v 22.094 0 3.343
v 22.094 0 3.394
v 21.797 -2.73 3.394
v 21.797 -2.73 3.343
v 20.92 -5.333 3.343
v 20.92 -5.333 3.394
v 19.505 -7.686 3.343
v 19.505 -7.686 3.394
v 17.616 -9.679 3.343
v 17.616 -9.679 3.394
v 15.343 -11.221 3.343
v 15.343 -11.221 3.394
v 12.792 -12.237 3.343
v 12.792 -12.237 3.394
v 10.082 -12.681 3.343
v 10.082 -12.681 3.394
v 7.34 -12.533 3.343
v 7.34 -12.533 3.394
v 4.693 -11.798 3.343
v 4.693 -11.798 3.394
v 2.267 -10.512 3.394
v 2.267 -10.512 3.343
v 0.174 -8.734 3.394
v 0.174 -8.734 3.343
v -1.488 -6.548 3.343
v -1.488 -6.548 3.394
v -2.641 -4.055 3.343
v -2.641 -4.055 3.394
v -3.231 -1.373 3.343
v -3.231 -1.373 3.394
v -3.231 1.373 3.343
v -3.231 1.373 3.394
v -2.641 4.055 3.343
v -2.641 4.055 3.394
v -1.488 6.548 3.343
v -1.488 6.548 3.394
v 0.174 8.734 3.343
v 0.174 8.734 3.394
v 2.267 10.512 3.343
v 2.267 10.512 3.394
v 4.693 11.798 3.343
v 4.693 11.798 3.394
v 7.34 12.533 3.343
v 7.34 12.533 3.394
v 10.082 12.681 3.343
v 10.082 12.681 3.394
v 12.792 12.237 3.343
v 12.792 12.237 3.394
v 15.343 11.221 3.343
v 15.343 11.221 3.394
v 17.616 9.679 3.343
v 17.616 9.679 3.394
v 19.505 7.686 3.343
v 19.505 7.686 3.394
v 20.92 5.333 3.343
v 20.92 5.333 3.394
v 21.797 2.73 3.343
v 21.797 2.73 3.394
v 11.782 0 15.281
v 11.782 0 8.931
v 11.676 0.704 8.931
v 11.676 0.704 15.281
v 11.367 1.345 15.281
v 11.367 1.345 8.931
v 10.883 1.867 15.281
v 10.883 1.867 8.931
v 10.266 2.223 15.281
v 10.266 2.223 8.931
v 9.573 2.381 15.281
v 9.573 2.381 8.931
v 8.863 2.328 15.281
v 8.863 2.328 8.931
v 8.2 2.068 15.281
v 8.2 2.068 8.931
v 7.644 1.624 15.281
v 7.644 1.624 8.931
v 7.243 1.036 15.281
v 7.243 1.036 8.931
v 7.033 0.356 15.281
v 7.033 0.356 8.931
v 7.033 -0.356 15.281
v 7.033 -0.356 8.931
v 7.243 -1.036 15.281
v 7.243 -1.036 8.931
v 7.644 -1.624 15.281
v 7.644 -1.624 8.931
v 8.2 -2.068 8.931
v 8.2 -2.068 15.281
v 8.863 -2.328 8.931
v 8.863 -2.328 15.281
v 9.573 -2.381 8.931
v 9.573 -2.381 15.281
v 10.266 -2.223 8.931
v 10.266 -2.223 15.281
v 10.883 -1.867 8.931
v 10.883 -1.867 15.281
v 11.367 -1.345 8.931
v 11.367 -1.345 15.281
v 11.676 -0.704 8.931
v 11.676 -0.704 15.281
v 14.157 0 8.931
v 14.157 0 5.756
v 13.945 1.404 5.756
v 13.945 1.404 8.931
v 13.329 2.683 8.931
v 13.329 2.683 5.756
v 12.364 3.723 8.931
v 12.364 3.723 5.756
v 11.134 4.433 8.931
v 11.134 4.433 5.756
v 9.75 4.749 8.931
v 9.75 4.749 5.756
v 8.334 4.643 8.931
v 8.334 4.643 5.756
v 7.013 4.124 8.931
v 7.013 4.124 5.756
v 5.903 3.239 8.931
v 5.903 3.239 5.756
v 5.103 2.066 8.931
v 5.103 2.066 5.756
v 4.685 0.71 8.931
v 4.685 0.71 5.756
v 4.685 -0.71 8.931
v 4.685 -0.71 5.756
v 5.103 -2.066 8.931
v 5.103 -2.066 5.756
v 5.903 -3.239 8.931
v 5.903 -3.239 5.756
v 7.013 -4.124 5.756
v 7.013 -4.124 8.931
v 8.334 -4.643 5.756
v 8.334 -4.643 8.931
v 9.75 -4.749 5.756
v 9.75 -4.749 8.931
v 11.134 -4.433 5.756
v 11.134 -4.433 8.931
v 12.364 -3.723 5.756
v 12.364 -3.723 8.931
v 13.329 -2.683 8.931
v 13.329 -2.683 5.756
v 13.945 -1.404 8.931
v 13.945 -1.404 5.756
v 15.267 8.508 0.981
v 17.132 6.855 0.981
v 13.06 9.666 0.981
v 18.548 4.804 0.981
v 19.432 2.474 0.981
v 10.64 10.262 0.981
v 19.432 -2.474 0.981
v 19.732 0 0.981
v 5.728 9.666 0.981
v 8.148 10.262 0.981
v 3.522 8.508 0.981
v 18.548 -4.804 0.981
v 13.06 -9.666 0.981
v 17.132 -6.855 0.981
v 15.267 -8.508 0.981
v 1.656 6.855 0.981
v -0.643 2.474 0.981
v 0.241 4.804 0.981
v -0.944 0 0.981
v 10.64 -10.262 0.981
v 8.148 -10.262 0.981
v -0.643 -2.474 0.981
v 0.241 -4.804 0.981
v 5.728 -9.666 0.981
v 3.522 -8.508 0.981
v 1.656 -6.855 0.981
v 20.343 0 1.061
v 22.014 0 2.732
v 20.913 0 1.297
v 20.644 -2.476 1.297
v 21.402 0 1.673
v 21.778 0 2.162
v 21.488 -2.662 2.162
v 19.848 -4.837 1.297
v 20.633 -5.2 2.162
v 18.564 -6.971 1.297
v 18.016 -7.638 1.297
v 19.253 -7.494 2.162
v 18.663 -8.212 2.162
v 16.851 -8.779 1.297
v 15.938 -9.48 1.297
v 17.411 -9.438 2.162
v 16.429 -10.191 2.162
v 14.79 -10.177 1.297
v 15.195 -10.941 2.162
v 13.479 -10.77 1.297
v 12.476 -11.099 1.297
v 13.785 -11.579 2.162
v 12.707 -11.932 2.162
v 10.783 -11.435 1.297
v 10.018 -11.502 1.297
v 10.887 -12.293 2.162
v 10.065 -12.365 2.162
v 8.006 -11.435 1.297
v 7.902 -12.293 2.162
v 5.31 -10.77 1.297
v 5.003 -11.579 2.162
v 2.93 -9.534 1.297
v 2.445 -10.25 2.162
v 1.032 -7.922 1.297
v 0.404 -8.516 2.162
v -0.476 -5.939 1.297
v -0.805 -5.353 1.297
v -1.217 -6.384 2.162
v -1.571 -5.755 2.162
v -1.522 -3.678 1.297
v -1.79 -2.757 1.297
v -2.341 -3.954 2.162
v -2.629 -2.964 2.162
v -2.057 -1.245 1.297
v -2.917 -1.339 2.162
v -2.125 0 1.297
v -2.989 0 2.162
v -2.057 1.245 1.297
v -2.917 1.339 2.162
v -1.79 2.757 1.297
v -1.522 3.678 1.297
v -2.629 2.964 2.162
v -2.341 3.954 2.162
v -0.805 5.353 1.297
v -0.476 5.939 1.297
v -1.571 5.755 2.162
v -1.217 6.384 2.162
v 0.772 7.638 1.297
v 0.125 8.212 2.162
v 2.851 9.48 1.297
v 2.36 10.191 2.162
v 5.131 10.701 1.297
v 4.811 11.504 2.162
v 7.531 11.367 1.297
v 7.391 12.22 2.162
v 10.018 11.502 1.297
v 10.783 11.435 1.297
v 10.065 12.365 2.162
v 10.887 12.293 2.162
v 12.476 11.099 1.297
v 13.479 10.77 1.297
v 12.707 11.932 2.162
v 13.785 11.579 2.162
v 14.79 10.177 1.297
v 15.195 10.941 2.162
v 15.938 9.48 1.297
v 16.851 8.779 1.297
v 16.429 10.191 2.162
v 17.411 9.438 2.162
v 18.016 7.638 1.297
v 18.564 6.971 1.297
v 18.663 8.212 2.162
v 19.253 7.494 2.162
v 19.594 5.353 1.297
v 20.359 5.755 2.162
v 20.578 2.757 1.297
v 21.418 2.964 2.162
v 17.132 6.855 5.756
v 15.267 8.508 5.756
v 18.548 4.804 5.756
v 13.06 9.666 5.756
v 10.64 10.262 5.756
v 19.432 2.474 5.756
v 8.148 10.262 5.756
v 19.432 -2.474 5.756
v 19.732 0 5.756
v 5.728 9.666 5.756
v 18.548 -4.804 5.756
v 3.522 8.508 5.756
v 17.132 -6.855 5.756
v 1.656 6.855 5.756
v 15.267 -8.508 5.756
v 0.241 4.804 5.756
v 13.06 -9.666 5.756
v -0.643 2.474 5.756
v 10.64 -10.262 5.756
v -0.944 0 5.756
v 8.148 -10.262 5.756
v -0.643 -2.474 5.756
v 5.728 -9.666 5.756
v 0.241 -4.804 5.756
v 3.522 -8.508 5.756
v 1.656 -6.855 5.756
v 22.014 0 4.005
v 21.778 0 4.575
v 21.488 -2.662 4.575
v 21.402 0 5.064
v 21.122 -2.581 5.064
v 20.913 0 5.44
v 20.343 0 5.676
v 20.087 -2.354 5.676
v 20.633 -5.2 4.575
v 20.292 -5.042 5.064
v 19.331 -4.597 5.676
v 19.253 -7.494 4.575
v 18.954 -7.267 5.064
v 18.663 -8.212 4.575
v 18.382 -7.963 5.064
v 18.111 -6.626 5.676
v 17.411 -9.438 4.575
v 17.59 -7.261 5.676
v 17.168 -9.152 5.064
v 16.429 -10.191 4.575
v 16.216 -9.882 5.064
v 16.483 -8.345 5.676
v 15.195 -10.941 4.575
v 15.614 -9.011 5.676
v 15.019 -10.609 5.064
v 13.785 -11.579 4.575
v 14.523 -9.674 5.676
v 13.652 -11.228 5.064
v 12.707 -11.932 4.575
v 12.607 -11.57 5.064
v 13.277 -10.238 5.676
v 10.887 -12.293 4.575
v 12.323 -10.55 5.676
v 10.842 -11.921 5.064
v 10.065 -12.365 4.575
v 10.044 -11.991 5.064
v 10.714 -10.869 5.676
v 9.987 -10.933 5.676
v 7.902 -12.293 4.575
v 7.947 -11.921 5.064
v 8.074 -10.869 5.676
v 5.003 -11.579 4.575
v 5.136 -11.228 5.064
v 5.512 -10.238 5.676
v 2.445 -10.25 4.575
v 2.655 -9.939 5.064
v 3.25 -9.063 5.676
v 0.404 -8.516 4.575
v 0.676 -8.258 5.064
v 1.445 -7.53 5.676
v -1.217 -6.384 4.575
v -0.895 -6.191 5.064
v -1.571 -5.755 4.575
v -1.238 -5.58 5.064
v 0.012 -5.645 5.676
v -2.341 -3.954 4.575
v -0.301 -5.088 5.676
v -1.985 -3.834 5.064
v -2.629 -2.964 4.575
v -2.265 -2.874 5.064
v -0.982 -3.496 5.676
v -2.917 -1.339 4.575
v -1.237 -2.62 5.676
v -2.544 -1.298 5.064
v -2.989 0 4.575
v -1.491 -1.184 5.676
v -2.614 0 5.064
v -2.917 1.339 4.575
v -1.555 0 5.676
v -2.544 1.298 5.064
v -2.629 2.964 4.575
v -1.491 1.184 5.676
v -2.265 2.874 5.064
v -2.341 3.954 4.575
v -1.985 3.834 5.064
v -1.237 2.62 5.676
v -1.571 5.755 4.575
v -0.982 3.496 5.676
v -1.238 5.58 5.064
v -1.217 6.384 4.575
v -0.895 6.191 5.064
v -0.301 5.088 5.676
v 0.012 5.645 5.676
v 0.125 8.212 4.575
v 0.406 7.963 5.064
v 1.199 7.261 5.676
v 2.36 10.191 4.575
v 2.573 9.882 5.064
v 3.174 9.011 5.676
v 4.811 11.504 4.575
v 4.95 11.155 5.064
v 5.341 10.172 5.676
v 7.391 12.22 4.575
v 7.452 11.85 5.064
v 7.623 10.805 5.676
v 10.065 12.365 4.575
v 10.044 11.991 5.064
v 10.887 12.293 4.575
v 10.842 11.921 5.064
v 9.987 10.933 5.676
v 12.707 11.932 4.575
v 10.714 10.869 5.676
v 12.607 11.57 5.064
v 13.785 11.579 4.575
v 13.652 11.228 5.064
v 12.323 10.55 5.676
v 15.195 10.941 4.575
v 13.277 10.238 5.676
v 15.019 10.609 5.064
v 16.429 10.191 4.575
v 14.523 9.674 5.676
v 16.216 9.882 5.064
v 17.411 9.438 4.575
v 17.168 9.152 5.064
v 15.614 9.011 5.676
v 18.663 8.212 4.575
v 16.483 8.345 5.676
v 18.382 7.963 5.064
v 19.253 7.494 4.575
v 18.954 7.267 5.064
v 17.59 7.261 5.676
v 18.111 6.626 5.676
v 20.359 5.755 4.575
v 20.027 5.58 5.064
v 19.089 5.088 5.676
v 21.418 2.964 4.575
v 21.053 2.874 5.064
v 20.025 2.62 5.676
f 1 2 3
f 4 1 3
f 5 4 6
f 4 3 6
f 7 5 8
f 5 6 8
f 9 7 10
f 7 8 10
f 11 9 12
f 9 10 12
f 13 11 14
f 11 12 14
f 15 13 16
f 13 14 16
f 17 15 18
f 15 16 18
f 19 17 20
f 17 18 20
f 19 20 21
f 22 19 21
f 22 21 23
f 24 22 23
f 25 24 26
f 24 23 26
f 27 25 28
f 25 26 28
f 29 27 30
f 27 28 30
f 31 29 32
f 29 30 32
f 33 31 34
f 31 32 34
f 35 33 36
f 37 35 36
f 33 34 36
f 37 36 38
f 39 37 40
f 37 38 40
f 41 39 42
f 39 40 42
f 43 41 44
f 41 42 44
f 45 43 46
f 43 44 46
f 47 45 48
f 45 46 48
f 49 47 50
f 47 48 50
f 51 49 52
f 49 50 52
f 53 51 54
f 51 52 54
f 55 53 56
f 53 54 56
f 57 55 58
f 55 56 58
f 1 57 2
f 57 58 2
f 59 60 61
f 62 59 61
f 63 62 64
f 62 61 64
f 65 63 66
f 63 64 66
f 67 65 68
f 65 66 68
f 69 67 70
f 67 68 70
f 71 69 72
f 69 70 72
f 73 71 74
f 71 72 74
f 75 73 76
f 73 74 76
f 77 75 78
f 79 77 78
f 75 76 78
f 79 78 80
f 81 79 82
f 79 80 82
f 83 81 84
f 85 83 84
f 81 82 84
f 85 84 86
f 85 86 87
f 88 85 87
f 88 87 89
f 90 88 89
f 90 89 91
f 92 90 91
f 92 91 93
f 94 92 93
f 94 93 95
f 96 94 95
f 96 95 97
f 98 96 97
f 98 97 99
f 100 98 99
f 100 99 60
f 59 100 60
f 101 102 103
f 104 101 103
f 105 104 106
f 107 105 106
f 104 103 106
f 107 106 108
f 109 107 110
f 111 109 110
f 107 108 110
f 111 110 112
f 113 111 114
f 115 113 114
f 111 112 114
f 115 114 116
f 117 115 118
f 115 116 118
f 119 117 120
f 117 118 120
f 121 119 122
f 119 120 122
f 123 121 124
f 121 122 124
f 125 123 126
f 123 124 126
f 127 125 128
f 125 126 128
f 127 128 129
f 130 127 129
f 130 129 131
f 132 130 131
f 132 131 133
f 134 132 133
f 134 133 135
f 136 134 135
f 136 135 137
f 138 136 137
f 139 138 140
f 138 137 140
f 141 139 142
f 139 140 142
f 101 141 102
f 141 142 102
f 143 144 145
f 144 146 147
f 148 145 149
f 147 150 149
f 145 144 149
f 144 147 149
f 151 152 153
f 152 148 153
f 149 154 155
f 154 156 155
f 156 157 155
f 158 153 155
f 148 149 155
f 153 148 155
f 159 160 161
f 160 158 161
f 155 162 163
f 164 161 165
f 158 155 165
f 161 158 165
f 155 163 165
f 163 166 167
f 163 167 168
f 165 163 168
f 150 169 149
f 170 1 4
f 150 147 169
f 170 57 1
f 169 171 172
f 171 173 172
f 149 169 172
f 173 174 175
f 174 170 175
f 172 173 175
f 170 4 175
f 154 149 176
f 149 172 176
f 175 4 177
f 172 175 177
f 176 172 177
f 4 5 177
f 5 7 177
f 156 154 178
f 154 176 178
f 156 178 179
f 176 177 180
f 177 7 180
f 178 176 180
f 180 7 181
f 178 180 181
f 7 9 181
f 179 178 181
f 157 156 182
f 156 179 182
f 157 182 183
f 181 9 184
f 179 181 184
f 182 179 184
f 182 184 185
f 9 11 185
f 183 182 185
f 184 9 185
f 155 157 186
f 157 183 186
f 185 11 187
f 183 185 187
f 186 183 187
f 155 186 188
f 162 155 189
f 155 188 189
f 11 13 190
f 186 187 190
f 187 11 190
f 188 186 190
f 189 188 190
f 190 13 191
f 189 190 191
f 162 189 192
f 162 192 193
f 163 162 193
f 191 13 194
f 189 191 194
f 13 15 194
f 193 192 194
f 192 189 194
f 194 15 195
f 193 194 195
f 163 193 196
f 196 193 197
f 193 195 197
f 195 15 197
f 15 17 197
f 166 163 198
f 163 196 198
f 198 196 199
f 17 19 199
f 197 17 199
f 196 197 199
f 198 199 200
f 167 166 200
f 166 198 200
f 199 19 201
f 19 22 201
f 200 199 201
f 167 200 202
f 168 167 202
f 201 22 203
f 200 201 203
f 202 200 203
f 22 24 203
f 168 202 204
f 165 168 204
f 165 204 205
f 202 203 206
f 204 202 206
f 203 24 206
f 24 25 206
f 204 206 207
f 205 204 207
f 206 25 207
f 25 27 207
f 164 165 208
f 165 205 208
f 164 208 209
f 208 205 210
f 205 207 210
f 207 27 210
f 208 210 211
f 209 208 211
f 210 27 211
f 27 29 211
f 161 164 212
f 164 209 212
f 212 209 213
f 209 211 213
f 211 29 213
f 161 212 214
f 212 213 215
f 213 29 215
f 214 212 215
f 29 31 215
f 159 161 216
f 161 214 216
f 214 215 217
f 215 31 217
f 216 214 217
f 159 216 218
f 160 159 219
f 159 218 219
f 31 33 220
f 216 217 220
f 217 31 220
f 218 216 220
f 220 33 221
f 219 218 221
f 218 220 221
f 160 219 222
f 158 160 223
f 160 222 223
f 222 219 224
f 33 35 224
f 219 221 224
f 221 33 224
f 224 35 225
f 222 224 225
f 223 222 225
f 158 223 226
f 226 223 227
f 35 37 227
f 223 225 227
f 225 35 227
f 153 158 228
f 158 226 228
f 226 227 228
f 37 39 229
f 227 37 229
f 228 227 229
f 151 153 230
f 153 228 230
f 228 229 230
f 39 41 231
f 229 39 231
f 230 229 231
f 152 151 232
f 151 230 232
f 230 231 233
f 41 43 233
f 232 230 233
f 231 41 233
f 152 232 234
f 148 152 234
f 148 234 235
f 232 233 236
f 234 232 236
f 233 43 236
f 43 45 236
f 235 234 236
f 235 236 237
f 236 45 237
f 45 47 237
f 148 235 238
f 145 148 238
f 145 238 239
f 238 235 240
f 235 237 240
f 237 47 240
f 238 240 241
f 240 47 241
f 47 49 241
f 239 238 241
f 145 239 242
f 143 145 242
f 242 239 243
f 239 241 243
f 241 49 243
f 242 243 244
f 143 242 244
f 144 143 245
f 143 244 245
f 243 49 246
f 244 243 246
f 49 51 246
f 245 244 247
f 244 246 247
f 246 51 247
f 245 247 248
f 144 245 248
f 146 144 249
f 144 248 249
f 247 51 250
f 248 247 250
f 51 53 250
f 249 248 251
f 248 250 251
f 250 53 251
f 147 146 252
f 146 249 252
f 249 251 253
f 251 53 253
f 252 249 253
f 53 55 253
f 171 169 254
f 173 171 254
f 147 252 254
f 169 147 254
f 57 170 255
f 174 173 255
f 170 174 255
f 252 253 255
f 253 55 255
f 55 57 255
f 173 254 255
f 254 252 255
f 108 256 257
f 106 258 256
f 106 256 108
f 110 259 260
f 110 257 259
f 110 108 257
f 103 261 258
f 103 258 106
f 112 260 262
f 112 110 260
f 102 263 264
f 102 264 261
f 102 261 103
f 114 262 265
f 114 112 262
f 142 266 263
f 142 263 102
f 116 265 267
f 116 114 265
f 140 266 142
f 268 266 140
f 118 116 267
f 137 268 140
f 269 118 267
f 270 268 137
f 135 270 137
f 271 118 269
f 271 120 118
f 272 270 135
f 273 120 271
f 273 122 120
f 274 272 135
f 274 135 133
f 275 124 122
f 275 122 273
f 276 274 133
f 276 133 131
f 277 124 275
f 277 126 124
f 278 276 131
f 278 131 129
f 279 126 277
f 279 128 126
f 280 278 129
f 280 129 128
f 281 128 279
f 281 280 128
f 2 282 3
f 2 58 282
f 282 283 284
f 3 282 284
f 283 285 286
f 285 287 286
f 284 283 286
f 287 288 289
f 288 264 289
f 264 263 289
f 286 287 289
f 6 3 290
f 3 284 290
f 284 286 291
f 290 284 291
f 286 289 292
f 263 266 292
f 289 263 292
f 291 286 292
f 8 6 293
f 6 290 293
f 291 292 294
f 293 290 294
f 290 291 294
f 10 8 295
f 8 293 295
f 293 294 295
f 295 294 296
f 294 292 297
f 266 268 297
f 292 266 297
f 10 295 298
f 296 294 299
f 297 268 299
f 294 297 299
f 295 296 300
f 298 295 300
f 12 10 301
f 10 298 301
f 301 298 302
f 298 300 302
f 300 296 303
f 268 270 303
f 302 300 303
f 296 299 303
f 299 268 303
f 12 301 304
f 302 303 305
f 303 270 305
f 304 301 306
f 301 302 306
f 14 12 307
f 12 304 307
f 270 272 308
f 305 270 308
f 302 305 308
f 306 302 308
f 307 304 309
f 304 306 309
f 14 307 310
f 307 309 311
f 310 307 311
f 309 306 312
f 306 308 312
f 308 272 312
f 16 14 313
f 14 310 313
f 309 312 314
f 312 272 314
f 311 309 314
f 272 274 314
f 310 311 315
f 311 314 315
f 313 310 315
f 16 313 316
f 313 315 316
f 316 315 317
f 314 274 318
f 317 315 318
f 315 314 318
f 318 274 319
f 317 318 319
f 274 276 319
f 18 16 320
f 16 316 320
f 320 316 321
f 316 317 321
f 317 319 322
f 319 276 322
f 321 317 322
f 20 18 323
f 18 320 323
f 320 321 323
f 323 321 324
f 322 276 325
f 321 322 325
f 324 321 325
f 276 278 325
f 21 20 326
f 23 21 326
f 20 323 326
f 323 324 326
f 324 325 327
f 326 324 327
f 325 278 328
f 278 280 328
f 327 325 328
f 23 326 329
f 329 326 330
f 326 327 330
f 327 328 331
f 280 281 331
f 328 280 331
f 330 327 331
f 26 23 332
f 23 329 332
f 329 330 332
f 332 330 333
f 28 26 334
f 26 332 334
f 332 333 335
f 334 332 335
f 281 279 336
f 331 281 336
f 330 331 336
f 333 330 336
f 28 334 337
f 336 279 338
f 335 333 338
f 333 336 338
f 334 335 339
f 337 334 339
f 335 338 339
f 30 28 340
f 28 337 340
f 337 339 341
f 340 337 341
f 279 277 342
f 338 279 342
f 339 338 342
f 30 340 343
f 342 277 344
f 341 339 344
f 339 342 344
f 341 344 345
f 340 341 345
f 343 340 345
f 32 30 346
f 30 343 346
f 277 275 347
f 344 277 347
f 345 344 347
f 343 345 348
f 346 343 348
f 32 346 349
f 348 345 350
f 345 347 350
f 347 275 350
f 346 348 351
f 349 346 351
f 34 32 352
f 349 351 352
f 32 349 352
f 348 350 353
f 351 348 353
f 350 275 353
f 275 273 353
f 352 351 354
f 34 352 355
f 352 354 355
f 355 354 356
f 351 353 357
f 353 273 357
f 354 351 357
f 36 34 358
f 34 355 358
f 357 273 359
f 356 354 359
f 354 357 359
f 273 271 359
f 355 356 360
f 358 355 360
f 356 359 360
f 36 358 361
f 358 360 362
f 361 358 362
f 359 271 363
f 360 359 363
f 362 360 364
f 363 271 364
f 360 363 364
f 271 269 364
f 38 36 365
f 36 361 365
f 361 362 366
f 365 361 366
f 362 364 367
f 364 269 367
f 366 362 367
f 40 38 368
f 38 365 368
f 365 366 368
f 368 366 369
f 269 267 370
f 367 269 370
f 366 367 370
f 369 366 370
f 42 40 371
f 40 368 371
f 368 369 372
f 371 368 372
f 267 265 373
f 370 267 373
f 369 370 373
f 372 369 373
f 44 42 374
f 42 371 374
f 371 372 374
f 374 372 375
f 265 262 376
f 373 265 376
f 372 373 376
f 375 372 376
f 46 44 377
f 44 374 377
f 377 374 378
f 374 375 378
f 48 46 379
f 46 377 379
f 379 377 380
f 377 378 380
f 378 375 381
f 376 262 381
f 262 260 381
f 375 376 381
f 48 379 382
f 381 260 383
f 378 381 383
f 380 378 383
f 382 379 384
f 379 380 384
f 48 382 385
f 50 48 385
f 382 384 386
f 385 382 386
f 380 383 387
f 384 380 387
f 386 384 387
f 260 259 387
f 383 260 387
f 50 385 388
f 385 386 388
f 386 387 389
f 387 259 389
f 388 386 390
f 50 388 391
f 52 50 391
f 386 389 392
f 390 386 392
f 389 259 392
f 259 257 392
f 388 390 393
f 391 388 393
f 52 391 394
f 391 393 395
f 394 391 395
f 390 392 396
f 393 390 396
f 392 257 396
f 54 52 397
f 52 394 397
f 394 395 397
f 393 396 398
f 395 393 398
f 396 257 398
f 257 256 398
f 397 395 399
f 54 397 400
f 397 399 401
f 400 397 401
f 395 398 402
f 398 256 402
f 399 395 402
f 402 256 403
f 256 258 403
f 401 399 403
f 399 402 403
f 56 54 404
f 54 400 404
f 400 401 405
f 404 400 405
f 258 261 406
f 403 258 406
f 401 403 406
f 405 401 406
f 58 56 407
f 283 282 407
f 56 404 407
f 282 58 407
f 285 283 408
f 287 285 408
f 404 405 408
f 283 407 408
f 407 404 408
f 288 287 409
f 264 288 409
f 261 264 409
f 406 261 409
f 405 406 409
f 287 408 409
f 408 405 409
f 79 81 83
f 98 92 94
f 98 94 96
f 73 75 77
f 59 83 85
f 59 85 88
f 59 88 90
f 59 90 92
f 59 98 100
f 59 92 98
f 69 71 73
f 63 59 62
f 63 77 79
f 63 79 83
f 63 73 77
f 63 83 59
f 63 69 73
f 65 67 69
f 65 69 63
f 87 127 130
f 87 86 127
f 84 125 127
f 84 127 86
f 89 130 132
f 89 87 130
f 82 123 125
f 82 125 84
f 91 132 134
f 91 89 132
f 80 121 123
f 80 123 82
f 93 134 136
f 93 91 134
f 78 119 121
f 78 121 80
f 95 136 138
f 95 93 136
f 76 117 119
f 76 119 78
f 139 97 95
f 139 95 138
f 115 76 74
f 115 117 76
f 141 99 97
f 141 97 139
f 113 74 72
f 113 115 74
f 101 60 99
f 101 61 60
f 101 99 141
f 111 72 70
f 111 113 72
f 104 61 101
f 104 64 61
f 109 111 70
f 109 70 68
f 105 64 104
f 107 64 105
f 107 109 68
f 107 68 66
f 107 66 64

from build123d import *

# Parameters (mm, degrees)
F0_W     = 12.7
F0_H     = 4.7752
F2_R     = 2.3622
F3_R     = 4.7625
F4_DEPTH = 3.175
F5_R     = 2.3876
F6_DEPTH = 9.525


with BuildPart() as f1:
    # F0 (on Front) → F1 (revolve)
    with BuildSketch(Plane.XZ):
        with Locations((15.7442009076, 3.3685917145)):
            Rectangle(F0_W, F0_H)
    revolve(axis=Axis((9.3942009076, 0, 3.3685917145), (0, 0, -1)))

    # F2
    f2_edges = [f1.edges().sort_by_distance(p)[0] for p in [
        (-3.305799, 0, 5.756192),
        (-3.305799, 0, 0.980992),
    ]]
    fillet(f2_edges, radius=F2_R)

    # F3 (on face) → F4 (join)
    with BuildSketch(Plane.XY.offset(5.7561917145)):
        with Locations((9.3942009076, 0)):
            Circle(F3_R)
    extrude(amount=F4_DEPTH)

    # F5 (on face) → F6 (join)
    with BuildSketch(Plane.XY.offset(5.7561917145)):
        with Locations((9.3942009076, 0)):
            Circle(F5_R)
    extrude(amount=F6_DEPTH)


solid = f1.part
